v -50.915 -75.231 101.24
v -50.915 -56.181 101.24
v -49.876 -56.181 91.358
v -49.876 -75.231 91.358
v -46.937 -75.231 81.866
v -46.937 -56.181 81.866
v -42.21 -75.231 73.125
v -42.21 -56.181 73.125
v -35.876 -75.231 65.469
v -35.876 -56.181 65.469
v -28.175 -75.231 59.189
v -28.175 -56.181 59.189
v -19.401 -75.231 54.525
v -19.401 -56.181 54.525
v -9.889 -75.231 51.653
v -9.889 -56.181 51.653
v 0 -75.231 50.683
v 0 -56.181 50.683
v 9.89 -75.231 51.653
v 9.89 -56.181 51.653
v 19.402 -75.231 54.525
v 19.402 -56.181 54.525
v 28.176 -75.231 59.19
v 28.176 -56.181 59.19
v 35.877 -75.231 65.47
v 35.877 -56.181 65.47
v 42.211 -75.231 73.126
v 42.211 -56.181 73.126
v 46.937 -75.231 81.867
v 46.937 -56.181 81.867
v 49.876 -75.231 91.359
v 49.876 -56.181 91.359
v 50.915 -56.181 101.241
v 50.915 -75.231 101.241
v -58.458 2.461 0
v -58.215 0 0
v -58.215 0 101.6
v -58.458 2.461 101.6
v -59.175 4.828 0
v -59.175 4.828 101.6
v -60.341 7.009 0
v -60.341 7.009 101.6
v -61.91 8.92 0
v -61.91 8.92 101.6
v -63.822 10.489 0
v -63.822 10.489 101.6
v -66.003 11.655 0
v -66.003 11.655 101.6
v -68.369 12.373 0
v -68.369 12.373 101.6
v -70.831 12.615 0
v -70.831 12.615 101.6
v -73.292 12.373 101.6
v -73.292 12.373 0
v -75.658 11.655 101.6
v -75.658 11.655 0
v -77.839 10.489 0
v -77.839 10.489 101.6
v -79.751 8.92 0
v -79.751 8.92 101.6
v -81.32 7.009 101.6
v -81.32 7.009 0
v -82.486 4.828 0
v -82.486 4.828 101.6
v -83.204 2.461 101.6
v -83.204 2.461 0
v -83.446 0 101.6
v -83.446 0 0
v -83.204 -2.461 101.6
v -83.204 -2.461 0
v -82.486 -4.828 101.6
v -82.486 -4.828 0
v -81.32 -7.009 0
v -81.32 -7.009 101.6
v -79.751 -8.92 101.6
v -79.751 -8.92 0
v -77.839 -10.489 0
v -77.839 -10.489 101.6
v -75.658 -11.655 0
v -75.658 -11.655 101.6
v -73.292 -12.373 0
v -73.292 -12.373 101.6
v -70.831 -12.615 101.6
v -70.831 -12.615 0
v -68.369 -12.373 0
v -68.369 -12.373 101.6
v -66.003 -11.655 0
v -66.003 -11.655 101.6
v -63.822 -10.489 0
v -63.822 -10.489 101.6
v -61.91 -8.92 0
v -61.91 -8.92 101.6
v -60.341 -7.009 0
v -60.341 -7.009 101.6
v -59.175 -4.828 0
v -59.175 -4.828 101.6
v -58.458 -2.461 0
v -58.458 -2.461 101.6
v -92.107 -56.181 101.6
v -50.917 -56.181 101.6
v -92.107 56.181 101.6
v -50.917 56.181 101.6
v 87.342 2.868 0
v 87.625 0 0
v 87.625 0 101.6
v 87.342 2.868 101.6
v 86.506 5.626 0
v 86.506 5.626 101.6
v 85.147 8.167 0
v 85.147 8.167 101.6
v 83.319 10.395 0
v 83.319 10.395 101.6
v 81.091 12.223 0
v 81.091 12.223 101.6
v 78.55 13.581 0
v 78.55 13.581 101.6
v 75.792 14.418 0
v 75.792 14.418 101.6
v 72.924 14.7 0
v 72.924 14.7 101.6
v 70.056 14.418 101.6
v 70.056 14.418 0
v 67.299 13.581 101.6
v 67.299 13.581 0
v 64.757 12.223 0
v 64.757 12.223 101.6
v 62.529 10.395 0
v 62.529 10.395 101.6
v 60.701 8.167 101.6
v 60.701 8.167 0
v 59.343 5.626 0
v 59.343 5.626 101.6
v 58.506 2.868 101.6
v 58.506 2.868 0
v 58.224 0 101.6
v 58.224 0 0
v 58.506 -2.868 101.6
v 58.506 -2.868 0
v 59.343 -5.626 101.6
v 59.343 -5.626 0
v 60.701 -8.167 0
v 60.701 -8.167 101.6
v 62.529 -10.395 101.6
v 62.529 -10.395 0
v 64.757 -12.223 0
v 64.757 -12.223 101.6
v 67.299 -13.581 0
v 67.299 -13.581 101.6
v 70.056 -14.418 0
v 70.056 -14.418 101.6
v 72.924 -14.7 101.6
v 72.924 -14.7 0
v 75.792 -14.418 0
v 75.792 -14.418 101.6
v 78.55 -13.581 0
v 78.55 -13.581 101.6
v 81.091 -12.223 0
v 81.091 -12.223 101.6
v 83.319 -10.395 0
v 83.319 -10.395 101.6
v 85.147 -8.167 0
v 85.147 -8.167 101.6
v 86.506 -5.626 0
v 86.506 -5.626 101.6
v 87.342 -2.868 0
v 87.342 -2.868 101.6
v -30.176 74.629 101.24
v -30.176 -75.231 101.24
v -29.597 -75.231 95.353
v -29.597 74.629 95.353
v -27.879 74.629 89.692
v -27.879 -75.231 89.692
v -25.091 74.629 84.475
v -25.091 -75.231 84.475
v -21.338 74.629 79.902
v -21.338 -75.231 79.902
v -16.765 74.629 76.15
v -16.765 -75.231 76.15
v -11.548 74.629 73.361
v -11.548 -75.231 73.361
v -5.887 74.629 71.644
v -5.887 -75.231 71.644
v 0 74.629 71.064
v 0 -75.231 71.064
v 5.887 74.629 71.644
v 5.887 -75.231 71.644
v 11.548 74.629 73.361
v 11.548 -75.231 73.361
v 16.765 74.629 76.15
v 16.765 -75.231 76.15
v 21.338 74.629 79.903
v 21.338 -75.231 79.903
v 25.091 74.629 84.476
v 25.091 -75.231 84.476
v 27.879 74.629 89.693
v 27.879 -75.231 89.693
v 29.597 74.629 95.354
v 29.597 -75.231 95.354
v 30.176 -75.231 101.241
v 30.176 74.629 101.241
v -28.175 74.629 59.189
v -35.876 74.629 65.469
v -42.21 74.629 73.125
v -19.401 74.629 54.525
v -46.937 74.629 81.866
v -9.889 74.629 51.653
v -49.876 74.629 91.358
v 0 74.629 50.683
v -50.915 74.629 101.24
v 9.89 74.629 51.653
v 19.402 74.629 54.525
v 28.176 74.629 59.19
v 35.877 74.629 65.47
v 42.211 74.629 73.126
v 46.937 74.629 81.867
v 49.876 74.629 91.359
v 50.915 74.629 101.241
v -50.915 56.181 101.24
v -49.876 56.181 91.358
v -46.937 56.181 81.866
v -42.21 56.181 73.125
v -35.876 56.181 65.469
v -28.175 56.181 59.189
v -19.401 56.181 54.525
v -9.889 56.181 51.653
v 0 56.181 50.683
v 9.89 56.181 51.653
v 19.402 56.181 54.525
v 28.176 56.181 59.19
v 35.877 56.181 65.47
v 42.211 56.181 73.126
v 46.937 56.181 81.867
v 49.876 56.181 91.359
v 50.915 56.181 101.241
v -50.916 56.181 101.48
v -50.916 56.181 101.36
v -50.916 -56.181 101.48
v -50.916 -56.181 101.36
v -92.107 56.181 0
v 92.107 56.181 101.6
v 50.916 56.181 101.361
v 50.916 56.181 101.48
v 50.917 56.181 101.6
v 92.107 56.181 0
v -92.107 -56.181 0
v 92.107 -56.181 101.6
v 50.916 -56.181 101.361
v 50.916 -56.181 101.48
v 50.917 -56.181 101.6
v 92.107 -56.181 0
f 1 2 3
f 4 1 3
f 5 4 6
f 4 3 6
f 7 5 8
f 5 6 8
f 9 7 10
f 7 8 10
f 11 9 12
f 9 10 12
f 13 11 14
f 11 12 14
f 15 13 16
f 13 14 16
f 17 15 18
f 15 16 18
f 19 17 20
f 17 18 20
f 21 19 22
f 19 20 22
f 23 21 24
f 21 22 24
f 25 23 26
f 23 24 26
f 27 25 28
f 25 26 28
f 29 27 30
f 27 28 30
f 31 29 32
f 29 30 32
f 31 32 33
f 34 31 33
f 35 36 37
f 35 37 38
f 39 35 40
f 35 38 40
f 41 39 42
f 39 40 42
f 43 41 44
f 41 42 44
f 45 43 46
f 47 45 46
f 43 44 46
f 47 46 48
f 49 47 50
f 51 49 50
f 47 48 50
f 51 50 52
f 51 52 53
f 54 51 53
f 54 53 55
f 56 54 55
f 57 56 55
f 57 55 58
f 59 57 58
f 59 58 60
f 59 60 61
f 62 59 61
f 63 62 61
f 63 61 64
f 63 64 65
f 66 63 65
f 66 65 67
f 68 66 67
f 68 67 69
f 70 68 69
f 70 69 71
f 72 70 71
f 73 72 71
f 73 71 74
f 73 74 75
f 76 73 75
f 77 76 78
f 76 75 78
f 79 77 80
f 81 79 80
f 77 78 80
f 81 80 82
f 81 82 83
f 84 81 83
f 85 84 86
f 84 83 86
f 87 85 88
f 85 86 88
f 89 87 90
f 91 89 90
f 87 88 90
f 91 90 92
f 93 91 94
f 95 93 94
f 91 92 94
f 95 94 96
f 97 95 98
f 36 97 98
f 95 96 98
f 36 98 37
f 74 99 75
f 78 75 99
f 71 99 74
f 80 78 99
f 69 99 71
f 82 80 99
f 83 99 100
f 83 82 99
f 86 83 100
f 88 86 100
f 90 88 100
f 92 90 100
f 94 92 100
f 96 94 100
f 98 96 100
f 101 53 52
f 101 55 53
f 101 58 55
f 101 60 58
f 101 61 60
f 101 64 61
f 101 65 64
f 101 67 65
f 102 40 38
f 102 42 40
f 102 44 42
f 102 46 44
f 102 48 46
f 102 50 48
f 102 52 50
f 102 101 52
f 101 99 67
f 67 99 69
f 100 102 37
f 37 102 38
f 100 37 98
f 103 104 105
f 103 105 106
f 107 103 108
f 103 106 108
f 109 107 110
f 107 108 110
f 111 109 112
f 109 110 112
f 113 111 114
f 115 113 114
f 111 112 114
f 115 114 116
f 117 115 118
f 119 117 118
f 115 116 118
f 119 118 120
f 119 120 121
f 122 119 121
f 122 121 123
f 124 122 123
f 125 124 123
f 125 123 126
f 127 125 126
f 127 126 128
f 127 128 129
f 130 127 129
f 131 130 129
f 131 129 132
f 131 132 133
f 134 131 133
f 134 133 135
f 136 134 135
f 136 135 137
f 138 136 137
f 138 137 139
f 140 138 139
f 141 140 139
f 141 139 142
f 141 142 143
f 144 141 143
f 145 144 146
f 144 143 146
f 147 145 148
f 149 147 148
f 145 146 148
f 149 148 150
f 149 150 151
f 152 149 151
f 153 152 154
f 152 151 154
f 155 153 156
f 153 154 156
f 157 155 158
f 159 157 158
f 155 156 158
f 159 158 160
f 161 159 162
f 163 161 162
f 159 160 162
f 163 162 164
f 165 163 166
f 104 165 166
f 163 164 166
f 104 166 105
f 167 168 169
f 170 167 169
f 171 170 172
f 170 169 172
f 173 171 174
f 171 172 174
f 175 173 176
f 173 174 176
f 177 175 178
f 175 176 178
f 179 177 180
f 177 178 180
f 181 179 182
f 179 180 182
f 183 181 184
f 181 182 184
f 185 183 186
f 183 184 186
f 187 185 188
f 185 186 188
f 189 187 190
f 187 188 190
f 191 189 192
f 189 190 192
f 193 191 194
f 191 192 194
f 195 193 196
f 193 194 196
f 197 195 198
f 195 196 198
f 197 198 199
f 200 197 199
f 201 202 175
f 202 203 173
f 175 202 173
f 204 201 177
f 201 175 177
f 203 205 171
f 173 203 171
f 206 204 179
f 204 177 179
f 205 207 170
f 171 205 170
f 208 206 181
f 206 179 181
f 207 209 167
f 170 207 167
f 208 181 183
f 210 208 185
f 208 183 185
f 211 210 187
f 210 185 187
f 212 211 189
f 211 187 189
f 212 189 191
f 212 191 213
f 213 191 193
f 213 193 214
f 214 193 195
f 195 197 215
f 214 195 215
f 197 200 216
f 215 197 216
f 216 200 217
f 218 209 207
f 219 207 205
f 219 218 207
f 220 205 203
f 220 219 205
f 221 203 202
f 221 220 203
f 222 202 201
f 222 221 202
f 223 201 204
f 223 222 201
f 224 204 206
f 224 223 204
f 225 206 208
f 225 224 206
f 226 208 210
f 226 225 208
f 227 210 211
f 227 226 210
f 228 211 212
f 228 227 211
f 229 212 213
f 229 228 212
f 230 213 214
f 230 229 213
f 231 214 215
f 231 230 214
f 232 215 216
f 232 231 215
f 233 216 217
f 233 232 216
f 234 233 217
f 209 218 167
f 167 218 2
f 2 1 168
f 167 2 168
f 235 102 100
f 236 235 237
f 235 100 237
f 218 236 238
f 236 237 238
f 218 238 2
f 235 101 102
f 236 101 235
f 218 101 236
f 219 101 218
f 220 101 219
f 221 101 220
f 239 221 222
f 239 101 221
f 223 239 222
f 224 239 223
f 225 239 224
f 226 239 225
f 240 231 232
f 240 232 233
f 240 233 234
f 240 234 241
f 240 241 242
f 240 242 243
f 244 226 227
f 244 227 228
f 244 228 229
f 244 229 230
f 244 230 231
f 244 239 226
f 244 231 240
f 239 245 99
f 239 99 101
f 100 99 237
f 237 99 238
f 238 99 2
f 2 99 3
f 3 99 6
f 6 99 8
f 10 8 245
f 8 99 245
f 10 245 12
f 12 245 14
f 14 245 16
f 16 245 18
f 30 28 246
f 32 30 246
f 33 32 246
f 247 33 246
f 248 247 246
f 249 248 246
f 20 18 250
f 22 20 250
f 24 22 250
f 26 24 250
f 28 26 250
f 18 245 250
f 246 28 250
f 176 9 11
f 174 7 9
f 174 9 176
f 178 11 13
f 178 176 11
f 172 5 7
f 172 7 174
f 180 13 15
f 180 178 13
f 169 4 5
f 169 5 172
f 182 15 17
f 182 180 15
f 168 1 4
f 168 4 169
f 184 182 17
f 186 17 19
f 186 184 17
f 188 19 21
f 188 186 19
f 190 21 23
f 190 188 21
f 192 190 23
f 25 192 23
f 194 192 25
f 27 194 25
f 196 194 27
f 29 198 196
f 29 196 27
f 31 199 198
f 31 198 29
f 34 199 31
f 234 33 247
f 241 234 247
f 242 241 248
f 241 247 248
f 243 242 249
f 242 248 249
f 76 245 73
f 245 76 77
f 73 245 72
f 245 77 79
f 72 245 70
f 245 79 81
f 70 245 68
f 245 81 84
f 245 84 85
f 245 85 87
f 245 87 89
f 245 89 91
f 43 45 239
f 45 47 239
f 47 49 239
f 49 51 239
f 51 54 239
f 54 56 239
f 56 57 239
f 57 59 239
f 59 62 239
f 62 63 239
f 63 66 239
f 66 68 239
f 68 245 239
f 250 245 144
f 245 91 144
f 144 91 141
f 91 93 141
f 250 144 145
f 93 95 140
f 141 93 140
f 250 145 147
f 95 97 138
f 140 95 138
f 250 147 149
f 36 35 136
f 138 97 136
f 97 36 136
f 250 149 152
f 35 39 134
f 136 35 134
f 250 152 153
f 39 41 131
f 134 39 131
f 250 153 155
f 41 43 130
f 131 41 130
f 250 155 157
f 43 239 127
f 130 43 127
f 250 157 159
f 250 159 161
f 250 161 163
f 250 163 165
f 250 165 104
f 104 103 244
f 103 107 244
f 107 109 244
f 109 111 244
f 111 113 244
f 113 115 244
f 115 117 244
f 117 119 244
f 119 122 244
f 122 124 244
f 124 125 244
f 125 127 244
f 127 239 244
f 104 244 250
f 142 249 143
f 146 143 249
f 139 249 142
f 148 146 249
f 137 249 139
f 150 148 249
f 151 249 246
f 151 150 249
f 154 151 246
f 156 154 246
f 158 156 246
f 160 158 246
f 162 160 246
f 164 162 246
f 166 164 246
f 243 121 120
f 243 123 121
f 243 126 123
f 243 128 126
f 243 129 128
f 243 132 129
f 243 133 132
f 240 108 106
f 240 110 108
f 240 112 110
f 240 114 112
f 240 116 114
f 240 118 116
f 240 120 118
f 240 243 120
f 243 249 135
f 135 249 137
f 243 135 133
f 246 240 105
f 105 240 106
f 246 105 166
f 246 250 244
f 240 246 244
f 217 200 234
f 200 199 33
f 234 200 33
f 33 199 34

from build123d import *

# Parameters (mm, degrees)
F0_W      = 184.214562
F0_H      = 112.362482
F1_DEPTH  = 101.6
F2_R      = 50.916607
F3_DEPTH  = 19.05
F3_FACE_R = 50.916607
F4_DEPTH  = 149.86
F6_DEPTH  = 330.2
F7_R      = 12.615392
F7_R_2    = 14.70042
F8_DEPTH  = 254
F9_R      = 30.176395
F10_DEPTH = 381


with BuildPart() as f1:
    # F0 (on Top) → F1 (new body)
    with BuildSketch(Plane.XY):
        Rectangle(F0_W, F0_H)
    extrude(amount=F1_DEPTH)

    # F2 (on face) → F3 (join)
    with BuildSketch(Plane.XZ.offset(56.181241)):
        with Locations((0, 101.6)):
            Circle(F2_R)
    extrude(amount=F3_DEPTH)

    # F3_face (on face) → F4 (join)
    with BuildSketch(Plane(origin=(0, -75.231241, 101.6), x_dir=(1, 0, 0), z_dir=(0, -1, 0))):
        Circle(F3_FACE_R)
    extrude(amount=-F4_DEPTH)

    # F5 (on face) → F6 (cut)
    with BuildSketch(Plane.XZ.offset(75.231241)):
        with BuildLine():
            Line((-50.915336, 101.240156), (50.915342, 101.241072))
            ThreePointArc((50.915342, 101.241072), (50.916291, 101.420535), (50.916607, 101.6))
            ThreePointArc((50.916607, 101.6), (-0.179923, 152.51629), (-50.915336, 101.240156))
        make_face()
    extrude(amount=-F6_DEPTH, mode=Mode.SUBTRACT)

    # F7 (on face) → F8 (cut)
    with BuildSketch(Plane.XY.offset(101.6)):
        with Locations((-70.830584, 0)):
            Circle(F7_R)
        with Locations((72.924256, 0)):
            Circle(F7_R_2)
    extrude(amount=-F8_DEPTH, mode=Mode.SUBTRACT)

    # F9 (on face) → F10 (cut)
    with BuildSketch(Plane.XZ.offset(75.231241)):
        with Locations((3e-06, 101.240614)):
            Circle(F9_R)
    extrude(amount=-F10_DEPTH, mode=Mode.SUBTRACT)


solid = f1.part
